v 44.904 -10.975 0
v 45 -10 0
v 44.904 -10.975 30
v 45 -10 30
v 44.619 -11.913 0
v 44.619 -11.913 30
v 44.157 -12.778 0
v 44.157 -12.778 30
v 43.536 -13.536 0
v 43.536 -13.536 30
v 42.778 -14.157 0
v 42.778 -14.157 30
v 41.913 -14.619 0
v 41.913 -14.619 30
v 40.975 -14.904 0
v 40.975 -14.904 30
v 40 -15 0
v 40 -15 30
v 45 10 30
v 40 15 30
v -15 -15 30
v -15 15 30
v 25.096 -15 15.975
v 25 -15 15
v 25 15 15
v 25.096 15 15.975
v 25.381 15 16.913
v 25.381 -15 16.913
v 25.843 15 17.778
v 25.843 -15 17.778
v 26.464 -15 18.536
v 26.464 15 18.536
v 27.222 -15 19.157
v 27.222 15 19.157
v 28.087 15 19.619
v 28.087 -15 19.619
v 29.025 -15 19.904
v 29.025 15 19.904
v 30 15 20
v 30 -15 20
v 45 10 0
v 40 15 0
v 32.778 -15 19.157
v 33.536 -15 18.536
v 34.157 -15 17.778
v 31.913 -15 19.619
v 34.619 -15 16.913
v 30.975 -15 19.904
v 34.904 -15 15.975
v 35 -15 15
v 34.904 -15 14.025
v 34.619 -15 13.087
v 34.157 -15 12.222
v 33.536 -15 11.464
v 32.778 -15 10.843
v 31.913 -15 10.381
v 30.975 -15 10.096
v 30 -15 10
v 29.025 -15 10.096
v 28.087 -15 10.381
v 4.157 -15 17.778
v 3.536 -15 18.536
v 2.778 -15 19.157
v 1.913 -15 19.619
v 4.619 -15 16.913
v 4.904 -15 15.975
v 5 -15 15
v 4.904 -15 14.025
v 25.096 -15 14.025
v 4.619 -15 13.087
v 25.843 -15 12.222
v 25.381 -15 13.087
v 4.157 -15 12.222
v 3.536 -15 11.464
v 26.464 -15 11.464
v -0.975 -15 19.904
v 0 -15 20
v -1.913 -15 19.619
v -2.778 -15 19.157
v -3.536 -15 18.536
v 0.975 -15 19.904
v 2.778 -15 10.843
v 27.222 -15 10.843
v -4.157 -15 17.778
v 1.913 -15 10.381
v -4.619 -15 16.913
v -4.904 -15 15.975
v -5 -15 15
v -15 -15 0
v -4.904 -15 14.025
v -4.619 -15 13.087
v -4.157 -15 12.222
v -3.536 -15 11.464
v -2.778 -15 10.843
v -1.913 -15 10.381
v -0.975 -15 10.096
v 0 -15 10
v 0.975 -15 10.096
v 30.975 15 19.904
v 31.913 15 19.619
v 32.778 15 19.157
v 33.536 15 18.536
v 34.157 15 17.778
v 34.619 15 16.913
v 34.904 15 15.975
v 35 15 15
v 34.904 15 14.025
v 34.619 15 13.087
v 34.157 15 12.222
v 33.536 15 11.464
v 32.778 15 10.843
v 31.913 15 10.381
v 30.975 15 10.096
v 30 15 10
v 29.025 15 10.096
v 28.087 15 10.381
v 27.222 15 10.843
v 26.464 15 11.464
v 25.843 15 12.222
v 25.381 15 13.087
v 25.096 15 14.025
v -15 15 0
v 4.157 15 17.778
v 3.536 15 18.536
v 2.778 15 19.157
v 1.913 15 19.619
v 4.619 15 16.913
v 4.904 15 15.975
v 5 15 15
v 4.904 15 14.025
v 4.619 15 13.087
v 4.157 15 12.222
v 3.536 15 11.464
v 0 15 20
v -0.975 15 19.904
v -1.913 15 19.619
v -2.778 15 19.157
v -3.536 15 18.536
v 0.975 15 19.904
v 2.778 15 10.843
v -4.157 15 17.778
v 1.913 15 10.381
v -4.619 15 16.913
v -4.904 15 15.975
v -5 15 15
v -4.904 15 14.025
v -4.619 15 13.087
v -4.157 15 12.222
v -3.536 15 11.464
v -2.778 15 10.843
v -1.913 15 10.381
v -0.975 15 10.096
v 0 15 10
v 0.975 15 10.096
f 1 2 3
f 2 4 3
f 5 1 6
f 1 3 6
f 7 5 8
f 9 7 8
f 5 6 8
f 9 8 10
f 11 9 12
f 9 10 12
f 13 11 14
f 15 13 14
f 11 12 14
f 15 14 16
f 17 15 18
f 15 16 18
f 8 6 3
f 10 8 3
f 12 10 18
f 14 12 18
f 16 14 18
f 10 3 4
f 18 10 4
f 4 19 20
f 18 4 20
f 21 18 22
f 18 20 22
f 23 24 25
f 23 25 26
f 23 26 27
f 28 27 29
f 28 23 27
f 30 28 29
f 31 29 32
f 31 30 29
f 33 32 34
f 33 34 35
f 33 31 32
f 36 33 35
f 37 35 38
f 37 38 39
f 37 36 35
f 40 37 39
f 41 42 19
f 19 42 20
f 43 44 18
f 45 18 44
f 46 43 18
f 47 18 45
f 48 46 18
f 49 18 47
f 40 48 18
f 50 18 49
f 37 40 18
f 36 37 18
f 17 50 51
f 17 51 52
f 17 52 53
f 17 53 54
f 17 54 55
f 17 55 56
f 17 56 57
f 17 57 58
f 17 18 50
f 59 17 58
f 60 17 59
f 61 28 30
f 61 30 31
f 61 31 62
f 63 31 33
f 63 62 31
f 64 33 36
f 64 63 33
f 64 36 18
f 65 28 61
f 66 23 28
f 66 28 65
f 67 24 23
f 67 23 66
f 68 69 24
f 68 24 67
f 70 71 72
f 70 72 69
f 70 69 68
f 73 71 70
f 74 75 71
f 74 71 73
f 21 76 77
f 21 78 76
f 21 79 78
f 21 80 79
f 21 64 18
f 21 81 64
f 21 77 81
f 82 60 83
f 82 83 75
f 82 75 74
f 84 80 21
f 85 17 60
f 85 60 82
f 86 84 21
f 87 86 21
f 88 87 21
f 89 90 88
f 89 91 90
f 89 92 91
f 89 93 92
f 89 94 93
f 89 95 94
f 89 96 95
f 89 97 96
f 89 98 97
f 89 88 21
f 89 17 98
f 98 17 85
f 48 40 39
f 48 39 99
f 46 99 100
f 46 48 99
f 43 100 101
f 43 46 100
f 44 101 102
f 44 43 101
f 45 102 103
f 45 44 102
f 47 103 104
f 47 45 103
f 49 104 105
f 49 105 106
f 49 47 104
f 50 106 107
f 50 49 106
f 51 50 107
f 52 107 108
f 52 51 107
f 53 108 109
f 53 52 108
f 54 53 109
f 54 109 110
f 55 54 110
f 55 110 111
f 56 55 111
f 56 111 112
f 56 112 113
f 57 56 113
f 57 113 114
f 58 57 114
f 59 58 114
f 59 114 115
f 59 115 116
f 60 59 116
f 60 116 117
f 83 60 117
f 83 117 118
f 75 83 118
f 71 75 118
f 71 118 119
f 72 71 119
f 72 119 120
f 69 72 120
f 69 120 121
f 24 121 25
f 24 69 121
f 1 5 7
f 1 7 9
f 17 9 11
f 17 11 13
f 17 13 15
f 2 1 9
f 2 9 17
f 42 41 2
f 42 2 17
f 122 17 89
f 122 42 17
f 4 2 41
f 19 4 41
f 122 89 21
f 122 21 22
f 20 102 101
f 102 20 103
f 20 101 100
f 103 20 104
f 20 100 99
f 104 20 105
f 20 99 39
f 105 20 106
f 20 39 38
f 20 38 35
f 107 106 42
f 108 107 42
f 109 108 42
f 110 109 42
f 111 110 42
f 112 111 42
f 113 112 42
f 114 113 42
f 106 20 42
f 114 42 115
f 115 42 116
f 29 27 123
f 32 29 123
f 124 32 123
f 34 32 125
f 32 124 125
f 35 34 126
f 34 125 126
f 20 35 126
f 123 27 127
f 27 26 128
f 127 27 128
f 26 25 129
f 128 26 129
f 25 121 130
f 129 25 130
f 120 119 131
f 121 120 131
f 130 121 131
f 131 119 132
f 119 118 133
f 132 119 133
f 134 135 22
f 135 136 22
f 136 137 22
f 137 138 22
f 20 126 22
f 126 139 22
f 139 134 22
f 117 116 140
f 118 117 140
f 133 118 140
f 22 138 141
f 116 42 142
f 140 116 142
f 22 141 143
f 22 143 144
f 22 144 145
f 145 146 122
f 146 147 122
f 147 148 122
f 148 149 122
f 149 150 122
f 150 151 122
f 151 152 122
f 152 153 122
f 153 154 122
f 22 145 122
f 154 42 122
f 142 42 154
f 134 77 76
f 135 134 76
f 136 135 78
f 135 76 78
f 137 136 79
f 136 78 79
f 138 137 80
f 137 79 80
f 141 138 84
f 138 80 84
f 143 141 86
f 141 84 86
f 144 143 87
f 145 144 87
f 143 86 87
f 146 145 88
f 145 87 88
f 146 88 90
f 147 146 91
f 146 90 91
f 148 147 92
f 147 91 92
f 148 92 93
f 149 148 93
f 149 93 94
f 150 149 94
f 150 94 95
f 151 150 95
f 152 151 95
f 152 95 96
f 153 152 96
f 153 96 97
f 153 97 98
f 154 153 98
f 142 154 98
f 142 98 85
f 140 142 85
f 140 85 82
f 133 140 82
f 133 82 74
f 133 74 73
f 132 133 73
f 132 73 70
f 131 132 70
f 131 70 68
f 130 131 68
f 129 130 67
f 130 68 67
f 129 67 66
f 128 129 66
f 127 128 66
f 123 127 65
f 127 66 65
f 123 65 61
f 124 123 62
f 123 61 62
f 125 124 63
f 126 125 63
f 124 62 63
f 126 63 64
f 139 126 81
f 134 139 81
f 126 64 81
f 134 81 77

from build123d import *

# Parameters (mm, degrees)
F0_W     = 30
F0_H     = 30
F1_DEPTH = 30
F3_DEPTH = 30.001
F5_R     = 5
F6_SIZE  = 5


with BuildPart() as f1:
    # F0 (on Top) → F1 (new body)
    with BuildSketch(Plane.XY):
        Rectangle(F0_W, F0_H)
    extrude(amount=F1_DEPTH)

    # F2 (on face) → F3 (cut, through all)
    with BuildSketch(Plane.XZ.offset(15)):
        with BuildLine():
            ThreePointArc((0, 20), (-3.5355339059, 11.4644660941), (5, 15))
            ThreePointArc((5, 15), (3.5355339059, 18.5355339059), (0, 20))
        make_face()
    extrude(amount=-F3_DEPTH, mode=Mode.SUBTRACT)

    # F4: F1 across face


with BuildPart() as f1_1:
    add(f1.part)
    add(f1.part.mirror(Plane(origin=(15, 0, 15), x_dir=(0, 1, 0), z_dir=(1, 0, 0))))

    # F5
    f5_edges = [f1_1.edges().sort_by_distance(p)[0] for p in [
        (45, -15, 15),
    ]]
    fillet(f5_edges, radius=F5_R)

    # F6
    f6_edges = [f1_1.edges().sort_by_distance(p)[0] for p in [
        (45, 15, 15),
    ]]
    chamfer(f6_edges, length=F6_SIZE)


solid = f1_1.part
